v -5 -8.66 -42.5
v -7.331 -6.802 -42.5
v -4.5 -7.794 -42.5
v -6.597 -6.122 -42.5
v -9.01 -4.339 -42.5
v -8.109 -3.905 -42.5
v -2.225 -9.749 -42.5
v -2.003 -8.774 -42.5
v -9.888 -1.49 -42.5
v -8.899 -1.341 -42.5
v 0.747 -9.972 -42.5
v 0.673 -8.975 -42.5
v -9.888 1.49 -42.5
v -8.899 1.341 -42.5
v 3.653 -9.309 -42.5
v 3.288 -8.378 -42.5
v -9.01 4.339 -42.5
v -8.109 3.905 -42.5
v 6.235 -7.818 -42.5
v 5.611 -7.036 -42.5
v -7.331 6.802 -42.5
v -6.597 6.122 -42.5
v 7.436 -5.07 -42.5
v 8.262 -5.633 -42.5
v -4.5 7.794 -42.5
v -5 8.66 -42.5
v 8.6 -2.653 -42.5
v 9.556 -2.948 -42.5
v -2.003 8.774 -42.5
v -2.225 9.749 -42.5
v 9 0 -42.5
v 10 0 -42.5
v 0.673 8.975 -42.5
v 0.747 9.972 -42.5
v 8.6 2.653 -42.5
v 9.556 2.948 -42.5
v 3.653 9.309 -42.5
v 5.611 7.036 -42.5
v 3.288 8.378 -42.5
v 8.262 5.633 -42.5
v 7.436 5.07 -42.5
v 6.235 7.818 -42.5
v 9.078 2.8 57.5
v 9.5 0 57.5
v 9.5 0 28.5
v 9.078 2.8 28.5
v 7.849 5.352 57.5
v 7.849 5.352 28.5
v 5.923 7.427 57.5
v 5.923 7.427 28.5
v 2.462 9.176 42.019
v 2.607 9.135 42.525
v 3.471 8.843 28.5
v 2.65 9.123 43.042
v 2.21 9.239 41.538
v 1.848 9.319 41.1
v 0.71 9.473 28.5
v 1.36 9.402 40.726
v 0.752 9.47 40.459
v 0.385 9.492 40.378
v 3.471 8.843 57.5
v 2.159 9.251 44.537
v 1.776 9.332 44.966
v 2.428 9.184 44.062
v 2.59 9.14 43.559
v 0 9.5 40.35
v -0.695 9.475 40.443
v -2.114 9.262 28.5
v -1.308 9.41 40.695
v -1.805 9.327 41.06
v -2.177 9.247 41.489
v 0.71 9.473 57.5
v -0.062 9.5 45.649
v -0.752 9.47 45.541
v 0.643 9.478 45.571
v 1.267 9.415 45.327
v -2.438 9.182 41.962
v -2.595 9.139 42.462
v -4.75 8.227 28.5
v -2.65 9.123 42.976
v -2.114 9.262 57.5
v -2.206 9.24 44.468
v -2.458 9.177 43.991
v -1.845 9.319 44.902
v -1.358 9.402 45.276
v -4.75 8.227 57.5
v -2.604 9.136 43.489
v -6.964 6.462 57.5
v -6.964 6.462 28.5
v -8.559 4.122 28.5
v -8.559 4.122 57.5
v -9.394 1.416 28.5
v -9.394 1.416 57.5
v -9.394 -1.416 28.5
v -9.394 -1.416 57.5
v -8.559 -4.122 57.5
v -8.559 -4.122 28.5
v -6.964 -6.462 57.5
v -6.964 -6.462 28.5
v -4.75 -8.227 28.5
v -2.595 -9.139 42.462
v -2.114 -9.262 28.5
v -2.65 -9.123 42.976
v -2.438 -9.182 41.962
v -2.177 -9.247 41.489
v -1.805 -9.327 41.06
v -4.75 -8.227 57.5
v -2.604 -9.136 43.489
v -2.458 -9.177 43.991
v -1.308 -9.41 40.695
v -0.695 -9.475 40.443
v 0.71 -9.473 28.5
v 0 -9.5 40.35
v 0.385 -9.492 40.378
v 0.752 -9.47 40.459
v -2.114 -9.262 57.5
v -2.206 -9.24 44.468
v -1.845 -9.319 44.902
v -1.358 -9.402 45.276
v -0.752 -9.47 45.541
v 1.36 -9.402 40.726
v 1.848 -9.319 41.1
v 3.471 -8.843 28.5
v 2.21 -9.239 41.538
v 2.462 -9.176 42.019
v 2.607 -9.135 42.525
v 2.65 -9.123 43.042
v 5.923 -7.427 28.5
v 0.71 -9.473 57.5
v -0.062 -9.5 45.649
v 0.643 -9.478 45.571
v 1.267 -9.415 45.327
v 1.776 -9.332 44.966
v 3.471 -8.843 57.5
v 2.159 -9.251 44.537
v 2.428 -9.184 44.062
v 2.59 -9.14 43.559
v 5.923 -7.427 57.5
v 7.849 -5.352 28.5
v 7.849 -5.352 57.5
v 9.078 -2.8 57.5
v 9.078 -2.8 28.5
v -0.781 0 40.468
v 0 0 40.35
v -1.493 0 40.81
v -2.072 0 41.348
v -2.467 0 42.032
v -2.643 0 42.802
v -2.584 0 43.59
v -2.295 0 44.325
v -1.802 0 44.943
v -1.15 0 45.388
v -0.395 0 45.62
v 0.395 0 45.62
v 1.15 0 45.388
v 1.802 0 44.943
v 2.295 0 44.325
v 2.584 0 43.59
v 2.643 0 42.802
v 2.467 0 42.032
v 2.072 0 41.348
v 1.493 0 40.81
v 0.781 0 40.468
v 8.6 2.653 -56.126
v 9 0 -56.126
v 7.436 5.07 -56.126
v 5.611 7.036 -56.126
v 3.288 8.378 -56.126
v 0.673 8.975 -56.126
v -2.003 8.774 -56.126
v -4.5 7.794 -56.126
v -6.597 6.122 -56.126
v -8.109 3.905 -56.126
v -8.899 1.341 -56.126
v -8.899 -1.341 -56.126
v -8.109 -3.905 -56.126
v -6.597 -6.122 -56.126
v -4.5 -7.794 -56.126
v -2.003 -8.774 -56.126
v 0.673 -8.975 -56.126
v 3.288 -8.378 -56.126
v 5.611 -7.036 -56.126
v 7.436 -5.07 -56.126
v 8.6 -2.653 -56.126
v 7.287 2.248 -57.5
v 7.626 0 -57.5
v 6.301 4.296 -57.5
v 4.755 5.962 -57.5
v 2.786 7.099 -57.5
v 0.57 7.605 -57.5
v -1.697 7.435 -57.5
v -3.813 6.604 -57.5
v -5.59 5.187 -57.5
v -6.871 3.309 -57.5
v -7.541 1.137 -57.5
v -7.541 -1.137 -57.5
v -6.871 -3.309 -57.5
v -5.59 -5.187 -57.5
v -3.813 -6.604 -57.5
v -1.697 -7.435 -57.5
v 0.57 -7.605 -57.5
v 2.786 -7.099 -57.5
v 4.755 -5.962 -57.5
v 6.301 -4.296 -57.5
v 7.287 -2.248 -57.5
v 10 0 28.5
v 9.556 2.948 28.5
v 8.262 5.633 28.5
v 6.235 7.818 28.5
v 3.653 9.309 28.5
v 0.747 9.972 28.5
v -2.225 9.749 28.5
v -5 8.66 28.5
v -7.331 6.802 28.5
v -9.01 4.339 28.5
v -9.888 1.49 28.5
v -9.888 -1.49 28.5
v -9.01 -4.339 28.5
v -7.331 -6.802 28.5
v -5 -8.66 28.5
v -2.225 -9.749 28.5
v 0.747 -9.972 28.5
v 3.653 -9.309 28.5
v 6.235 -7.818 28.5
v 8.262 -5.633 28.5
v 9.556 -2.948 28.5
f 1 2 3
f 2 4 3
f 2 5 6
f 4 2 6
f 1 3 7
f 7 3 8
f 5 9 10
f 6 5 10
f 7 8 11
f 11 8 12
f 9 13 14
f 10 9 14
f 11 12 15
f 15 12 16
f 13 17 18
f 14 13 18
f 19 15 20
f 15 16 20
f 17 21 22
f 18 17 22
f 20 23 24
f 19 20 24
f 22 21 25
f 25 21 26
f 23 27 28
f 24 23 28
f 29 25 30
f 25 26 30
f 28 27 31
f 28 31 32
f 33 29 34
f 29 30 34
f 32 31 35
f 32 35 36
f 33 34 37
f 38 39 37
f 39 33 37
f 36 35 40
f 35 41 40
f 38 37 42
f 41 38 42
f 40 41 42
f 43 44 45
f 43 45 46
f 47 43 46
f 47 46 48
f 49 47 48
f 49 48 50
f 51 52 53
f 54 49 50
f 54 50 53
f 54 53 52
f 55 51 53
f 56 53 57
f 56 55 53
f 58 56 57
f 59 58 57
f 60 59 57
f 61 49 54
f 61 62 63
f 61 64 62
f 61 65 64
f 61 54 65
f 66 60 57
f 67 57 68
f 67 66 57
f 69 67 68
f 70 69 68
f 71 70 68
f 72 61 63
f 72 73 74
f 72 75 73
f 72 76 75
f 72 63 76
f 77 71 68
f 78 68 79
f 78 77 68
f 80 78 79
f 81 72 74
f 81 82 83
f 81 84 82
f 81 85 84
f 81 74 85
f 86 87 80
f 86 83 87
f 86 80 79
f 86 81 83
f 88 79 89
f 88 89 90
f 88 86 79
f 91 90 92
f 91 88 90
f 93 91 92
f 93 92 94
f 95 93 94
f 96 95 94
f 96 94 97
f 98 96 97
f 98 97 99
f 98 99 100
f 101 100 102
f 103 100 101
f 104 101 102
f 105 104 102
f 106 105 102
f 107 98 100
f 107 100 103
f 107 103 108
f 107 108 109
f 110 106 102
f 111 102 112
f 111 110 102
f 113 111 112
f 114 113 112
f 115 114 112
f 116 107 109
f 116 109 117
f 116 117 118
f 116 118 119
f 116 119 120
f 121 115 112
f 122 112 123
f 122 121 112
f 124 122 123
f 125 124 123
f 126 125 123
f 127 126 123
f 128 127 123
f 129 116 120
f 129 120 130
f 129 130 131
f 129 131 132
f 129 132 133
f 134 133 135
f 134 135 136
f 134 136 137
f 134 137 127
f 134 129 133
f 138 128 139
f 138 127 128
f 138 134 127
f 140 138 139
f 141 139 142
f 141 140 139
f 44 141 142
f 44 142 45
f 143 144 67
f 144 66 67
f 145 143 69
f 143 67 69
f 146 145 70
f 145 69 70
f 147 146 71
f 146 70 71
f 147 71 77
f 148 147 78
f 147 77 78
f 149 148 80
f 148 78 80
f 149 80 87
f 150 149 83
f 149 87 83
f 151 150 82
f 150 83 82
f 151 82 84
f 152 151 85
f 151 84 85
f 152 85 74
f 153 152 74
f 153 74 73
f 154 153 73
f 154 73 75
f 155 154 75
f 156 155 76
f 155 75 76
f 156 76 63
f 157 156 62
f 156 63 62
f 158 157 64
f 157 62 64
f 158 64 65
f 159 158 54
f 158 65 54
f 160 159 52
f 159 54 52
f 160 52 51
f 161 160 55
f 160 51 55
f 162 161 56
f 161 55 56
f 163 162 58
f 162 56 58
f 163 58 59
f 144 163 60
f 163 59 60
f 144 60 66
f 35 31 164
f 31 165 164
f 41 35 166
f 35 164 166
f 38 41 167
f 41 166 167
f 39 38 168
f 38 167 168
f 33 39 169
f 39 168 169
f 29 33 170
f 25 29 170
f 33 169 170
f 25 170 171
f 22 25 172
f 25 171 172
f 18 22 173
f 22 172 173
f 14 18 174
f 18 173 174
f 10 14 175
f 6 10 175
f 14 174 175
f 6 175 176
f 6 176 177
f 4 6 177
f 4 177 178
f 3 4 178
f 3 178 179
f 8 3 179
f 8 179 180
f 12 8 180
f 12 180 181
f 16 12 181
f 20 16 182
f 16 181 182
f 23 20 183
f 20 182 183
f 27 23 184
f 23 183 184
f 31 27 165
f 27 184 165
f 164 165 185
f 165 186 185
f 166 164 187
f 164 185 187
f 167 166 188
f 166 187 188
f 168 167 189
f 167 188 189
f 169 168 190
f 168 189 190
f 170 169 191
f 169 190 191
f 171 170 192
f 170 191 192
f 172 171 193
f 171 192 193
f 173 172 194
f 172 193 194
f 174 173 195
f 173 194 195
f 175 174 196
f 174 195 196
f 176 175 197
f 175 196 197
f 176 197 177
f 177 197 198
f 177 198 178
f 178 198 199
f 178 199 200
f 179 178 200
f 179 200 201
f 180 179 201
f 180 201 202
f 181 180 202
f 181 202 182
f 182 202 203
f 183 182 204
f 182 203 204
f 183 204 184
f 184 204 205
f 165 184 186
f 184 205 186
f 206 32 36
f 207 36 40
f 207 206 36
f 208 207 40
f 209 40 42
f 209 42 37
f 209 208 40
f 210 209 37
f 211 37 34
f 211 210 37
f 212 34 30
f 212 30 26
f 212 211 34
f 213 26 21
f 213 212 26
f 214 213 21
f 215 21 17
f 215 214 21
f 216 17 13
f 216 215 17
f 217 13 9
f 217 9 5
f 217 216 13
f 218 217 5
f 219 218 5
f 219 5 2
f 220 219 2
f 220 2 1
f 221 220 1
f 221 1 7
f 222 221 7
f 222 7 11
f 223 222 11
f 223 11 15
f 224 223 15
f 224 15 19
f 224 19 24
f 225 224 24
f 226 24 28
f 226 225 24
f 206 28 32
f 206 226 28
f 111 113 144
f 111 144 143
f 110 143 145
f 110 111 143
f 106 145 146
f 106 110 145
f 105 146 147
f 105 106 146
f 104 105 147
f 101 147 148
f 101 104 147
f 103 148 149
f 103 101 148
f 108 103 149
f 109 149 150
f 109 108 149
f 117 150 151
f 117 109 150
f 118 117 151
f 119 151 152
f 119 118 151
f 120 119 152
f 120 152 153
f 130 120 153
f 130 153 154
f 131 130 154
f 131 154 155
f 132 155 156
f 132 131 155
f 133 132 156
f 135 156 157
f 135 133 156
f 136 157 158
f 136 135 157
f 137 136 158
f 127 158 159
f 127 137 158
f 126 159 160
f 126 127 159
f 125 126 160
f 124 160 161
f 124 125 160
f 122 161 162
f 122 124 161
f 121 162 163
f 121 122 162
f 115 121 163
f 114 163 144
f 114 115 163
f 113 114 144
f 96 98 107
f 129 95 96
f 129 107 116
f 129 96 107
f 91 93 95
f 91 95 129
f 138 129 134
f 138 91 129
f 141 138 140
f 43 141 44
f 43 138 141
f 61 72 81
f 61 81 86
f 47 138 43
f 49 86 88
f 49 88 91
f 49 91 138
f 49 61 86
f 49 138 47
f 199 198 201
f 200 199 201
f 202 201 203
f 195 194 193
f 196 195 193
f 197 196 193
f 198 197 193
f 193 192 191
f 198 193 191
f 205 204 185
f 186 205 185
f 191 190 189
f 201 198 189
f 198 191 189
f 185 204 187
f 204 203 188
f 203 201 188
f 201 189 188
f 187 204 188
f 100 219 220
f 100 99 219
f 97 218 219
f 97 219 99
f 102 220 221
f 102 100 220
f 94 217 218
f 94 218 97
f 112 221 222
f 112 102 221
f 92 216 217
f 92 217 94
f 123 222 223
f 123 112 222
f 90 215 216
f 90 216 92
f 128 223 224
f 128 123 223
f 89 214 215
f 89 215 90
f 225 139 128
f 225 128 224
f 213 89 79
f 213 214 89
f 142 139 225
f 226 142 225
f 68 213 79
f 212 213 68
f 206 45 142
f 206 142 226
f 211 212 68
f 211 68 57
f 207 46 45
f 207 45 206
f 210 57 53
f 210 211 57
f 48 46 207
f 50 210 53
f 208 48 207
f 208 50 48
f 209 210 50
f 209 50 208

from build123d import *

# Parameters (mm, degrees)
SKETCH1_R           = 10
BOSS_EXTRUDE1_DEPTH = 57.5
SKETCH7_R           = 10
SKETCH7_R_2         = 9.5
CUT_EXTRUDE1_DEPTH  = 29
SKETCH10_W          = 2.65
SKETCH10_H          = 10


# Read off the part's stored shape, not the designer's step: M18x2.5 Machine Threads Stud1
with BuildPart() as part:
    # Sketch1 → Boss-Extrude1 (new, symmetric)
    with BuildSketch(Plane.XY):
        Circle(SKETCH1_R)
    extrude(amount=BOSS_EXTRUDE1_DEPTH, both=True)

    # M18x2.5 Machine Threads Stud1 outline → M18x2.5 Machine Threads Stud1 (revolve, cut)
    with BuildSketch(Plane.XZ):
        Polygon((7.626, -57.5), (10, -57.5), (10, -42.5), (9, -42.5), (9, -56.126), align=None)
    revolve(axis=Axis((0, 0, 0), (0, 0, 1)), mode=Mode.SUBTRACT)

    # Sketch7 → Cut-Extrude1 (cut)
    with BuildSketch(Plane.XY.offset(57.5)):
        Circle(SKETCH7_R)
        Circle(SKETCH7_R_2, mode=Mode.SUBTRACT)
    extrude(amount=-CUT_EXTRUDE1_DEPTH, mode=Mode.SUBTRACT)

    # Sketch10 → M5 Clearance Hole1 (revolve, cut)
    with BuildSketch(Plane(origin=(0, 0, 43), x_dir=(0, 0, -1), z_dir=(1, 0, 0))):
        with Locations((1.325, 5)):
            Rectangle(SKETCH10_W, SKETCH10_H)
    m5_clearance_hole1 = revolve(axis=Axis((0, -6.35, 43), (0, 1, 0)), mode=Mode.SUBTRACT)

    # Mirror2: M5 Clearance Hole1 across plane
    add(m5_clearance_hole1.mirror(Plane.ZX), mode=Mode.SUBTRACT)


solid = part.part
